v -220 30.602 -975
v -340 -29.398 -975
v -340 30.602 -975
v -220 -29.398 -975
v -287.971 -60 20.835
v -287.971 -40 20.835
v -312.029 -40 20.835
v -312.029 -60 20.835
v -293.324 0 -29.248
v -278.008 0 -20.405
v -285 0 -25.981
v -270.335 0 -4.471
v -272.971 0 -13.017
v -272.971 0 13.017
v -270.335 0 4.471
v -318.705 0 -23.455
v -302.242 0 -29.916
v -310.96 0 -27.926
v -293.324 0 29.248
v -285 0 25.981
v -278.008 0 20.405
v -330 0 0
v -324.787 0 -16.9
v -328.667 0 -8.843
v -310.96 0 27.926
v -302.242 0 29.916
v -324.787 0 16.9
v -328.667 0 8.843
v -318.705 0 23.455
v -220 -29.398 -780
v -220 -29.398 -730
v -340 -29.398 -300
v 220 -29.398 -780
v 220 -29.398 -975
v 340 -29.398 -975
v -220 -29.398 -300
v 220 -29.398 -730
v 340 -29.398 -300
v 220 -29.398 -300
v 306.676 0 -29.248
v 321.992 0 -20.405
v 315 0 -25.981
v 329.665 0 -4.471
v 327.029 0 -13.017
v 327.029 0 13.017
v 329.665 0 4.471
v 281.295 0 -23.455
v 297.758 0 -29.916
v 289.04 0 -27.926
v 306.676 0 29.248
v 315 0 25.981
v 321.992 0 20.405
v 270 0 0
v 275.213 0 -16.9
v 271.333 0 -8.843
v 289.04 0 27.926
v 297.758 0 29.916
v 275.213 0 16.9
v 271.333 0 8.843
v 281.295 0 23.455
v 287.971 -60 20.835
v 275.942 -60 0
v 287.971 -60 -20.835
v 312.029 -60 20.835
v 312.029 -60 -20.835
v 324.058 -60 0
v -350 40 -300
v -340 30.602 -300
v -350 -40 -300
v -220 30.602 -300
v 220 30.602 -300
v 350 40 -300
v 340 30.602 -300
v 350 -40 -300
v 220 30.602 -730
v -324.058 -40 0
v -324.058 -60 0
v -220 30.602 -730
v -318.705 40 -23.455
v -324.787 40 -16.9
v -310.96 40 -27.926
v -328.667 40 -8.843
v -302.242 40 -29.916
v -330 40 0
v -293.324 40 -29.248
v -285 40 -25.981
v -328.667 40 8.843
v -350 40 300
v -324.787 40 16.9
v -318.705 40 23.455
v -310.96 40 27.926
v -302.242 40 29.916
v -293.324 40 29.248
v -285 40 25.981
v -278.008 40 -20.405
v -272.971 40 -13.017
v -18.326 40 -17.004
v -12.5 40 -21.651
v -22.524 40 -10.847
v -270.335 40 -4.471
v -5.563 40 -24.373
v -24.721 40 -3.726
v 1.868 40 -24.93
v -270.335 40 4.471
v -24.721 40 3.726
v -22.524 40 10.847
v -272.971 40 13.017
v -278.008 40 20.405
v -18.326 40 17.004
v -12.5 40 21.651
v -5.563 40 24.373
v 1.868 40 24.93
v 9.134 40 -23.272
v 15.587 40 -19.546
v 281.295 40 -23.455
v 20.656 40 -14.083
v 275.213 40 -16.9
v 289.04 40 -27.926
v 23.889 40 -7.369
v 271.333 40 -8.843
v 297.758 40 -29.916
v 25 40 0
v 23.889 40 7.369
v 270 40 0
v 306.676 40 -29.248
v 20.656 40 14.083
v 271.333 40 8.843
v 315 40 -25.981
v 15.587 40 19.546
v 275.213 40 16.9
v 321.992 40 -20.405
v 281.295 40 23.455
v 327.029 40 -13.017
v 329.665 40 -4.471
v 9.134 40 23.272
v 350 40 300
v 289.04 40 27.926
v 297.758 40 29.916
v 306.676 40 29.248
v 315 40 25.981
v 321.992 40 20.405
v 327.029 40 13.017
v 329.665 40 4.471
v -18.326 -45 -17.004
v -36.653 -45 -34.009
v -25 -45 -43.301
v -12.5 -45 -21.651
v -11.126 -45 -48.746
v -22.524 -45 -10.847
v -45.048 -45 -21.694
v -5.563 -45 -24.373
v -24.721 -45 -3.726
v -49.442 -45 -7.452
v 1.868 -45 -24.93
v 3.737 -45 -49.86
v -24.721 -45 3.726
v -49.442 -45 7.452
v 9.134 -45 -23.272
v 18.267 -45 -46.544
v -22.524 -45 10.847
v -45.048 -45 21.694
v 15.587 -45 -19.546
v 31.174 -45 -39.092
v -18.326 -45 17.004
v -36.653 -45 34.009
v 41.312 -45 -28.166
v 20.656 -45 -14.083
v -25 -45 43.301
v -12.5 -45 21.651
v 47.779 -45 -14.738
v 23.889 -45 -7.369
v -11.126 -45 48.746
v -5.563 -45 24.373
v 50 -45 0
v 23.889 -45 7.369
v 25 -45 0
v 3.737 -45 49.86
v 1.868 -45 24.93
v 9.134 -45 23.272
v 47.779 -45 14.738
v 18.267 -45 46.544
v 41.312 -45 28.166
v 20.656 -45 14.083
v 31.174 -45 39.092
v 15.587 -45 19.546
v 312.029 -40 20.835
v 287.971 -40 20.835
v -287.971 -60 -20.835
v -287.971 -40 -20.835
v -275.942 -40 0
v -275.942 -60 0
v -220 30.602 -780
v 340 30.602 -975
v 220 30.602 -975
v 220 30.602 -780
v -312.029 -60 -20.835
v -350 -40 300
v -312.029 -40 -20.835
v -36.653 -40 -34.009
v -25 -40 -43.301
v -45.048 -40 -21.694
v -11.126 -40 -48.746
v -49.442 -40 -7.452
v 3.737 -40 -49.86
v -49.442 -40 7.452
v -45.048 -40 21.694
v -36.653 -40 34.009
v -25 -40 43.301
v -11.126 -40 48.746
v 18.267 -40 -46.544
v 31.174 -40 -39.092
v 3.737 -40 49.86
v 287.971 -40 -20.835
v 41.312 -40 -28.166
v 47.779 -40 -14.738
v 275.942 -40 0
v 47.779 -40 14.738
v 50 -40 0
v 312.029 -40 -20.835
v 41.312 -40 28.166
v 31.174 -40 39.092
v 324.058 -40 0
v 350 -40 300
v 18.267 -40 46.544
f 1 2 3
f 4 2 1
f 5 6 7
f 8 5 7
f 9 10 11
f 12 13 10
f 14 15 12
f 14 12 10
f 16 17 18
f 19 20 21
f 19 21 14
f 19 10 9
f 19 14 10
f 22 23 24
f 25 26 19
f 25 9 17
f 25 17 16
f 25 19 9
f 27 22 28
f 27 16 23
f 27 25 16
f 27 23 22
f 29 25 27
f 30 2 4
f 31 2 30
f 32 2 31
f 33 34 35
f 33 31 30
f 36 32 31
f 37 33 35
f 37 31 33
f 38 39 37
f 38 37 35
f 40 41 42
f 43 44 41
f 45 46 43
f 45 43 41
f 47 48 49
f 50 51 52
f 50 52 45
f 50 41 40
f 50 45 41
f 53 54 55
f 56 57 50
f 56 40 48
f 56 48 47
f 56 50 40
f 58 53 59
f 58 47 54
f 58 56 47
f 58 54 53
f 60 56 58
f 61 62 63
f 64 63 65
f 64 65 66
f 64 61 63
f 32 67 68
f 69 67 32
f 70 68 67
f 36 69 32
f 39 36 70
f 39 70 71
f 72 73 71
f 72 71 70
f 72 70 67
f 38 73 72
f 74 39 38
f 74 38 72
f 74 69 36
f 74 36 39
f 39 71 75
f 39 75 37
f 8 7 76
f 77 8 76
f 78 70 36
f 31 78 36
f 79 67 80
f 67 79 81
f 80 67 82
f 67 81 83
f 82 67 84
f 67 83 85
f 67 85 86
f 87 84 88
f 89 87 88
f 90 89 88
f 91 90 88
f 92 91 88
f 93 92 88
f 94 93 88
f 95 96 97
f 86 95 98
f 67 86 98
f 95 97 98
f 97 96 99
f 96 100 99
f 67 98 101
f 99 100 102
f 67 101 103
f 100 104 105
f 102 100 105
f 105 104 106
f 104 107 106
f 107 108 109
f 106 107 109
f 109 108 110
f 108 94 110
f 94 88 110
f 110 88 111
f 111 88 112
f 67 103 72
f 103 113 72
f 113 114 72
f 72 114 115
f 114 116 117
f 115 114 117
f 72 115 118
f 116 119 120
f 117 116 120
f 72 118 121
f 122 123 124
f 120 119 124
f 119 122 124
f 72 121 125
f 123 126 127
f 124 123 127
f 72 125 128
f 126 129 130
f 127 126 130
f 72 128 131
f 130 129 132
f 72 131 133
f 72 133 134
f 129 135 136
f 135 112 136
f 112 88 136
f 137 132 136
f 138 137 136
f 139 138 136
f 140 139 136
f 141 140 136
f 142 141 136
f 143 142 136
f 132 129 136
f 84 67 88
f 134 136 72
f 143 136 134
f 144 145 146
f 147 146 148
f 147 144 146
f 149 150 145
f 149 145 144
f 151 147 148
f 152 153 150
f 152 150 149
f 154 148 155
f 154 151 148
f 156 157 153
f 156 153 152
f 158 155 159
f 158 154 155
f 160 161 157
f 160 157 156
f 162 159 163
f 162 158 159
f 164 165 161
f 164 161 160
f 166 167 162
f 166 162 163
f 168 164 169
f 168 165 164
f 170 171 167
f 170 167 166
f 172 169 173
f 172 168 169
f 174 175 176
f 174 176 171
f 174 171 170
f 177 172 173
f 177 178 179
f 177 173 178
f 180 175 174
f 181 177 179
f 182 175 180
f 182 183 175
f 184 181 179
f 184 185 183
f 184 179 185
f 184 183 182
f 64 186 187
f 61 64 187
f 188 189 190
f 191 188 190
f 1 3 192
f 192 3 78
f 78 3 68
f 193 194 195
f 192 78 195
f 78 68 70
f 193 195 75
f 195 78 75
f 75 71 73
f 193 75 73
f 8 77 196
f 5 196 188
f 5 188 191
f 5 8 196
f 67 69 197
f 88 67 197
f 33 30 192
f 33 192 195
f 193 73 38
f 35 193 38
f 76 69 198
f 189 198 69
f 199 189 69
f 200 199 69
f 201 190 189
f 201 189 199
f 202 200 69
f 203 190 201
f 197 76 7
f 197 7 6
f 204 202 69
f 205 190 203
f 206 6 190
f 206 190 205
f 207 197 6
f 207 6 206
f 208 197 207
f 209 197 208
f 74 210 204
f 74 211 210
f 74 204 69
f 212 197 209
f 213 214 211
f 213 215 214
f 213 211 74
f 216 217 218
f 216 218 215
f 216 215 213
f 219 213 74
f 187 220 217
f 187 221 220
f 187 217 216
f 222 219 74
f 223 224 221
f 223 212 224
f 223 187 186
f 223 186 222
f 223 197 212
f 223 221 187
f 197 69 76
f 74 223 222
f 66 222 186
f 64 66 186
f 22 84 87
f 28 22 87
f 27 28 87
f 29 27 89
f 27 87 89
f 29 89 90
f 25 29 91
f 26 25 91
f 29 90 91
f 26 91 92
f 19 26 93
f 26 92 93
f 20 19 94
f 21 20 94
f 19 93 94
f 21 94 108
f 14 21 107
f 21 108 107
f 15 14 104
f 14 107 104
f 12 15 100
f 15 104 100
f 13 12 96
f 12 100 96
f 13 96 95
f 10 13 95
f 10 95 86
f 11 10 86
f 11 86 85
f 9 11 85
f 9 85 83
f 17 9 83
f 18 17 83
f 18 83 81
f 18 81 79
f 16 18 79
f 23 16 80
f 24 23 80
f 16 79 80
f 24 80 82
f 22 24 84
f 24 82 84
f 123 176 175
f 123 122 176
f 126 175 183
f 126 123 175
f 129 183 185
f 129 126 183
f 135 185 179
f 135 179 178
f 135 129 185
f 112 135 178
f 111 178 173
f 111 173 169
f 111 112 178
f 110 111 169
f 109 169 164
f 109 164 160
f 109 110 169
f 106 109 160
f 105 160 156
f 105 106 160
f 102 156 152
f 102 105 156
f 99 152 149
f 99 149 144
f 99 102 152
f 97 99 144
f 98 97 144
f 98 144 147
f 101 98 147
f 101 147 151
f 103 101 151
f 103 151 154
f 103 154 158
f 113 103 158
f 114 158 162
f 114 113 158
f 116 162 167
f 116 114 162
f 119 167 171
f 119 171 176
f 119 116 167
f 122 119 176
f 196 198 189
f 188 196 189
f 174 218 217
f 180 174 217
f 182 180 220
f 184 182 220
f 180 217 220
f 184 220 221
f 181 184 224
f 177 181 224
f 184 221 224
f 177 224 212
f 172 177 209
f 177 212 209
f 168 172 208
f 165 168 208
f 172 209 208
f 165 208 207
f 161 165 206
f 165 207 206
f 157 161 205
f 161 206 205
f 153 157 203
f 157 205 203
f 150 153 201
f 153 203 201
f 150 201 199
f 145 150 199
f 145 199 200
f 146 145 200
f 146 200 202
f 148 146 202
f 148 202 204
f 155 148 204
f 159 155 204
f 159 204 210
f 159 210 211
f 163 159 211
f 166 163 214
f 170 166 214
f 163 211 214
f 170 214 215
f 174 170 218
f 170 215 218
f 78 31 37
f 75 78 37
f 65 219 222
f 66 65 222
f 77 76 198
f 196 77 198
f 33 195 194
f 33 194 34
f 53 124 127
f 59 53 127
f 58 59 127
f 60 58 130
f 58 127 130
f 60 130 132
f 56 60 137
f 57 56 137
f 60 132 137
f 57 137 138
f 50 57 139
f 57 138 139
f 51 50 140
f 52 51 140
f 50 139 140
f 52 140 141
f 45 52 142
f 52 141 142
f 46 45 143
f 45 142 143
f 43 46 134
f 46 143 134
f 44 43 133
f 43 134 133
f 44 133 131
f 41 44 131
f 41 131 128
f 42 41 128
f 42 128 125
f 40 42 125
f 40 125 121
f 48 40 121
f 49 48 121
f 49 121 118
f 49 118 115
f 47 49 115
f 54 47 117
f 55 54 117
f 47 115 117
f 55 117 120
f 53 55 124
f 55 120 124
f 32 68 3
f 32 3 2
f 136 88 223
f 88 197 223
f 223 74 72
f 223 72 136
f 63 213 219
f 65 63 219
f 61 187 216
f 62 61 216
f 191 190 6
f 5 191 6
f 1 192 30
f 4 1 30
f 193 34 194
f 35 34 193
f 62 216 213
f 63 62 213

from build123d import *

# Parameters (mm, degrees)
F0_W      = 700
F0_H      = 600
F0_R      = 25
F1_DEPTH  = 40
F2_R      = 30
F3_DEPTH  = 40
F5_DEPTH  = 20
F6_W      = 120
F6_H      = 60
F7_DEPTH  = 675
F8_W      = 440
F8_H      = 50
F9_DEPTH  = 60
F10_R     = 50
F10_R_2   = 25
F11_DEPTH = 5


with BuildPart() as f1:
    # F0 (on Front) → F1 (new body, symmetric)
    with BuildSketch(Plane.XZ):
        Rectangle(F0_W, F0_H)
        Circle(F0_R, mode=Mode.SUBTRACT)
    extrude(amount=F1_DEPTH, both=True)

    # F2 (on face) → F3 (cut)
    with BuildSketch(Plane(origin=(0, 40, 0), x_dir=(-1, 0, 0), z_dir=(0, 1, 0))):
        with Locations((-300, 0)):
            Circle(F2_R)
        with Locations((300, 0)):
            Circle(F2_R)
    extrude(amount=-F3_DEPTH, mode=Mode.SUBTRACT)

    # F4 (on face) → F5 (join)
    with BuildSketch(Plane.XZ.offset(40)):
        Polygon((-312.029017, -20.834869), (-287.970983, -20.834869), (-275.941965, 0), (-287.970983, 20.834869), (-312.029017, 20.834869), (-324.058035, 0), align=None)
        Polygon((287.970983, 20.834869), (275.941965, 0), (287.970983, -20.834869), (312.029017, -20.834869), (324.058035, 0), (312.029017, 20.834869), align=None)
    extrude(amount=F5_DEPTH)

    # F6 (on face) → F7 (join)
    with BuildSketch(Plane(origin=(0, 0, -300), x_dir=(1, 0, 0), z_dir=(0, 0, -1))):
        with Locations((-280, -0.602355)):
            Rectangle(F6_W, F6_H)
        with Locations((280, -0.602355)):
            Rectangle(F6_W, F6_H)
    extrude(amount=F7_DEPTH)

    # F8 (on face) → F9 (join)
    with BuildSketch(Plane.XZ.offset(29.397645)):
        with Locations((0, -755)):
            Rectangle(F8_W, F8_H)
    extrude(amount=-F9_DEPTH)

    # F10 (on face) → F11 (join)
    with BuildSketch(Plane.XZ.offset(40)):
        Circle(F10_R)
        Circle(F10_R_2, mode=Mode.SUBTRACT)
    extrude(amount=F11_DEPTH)


solid = f1.part
